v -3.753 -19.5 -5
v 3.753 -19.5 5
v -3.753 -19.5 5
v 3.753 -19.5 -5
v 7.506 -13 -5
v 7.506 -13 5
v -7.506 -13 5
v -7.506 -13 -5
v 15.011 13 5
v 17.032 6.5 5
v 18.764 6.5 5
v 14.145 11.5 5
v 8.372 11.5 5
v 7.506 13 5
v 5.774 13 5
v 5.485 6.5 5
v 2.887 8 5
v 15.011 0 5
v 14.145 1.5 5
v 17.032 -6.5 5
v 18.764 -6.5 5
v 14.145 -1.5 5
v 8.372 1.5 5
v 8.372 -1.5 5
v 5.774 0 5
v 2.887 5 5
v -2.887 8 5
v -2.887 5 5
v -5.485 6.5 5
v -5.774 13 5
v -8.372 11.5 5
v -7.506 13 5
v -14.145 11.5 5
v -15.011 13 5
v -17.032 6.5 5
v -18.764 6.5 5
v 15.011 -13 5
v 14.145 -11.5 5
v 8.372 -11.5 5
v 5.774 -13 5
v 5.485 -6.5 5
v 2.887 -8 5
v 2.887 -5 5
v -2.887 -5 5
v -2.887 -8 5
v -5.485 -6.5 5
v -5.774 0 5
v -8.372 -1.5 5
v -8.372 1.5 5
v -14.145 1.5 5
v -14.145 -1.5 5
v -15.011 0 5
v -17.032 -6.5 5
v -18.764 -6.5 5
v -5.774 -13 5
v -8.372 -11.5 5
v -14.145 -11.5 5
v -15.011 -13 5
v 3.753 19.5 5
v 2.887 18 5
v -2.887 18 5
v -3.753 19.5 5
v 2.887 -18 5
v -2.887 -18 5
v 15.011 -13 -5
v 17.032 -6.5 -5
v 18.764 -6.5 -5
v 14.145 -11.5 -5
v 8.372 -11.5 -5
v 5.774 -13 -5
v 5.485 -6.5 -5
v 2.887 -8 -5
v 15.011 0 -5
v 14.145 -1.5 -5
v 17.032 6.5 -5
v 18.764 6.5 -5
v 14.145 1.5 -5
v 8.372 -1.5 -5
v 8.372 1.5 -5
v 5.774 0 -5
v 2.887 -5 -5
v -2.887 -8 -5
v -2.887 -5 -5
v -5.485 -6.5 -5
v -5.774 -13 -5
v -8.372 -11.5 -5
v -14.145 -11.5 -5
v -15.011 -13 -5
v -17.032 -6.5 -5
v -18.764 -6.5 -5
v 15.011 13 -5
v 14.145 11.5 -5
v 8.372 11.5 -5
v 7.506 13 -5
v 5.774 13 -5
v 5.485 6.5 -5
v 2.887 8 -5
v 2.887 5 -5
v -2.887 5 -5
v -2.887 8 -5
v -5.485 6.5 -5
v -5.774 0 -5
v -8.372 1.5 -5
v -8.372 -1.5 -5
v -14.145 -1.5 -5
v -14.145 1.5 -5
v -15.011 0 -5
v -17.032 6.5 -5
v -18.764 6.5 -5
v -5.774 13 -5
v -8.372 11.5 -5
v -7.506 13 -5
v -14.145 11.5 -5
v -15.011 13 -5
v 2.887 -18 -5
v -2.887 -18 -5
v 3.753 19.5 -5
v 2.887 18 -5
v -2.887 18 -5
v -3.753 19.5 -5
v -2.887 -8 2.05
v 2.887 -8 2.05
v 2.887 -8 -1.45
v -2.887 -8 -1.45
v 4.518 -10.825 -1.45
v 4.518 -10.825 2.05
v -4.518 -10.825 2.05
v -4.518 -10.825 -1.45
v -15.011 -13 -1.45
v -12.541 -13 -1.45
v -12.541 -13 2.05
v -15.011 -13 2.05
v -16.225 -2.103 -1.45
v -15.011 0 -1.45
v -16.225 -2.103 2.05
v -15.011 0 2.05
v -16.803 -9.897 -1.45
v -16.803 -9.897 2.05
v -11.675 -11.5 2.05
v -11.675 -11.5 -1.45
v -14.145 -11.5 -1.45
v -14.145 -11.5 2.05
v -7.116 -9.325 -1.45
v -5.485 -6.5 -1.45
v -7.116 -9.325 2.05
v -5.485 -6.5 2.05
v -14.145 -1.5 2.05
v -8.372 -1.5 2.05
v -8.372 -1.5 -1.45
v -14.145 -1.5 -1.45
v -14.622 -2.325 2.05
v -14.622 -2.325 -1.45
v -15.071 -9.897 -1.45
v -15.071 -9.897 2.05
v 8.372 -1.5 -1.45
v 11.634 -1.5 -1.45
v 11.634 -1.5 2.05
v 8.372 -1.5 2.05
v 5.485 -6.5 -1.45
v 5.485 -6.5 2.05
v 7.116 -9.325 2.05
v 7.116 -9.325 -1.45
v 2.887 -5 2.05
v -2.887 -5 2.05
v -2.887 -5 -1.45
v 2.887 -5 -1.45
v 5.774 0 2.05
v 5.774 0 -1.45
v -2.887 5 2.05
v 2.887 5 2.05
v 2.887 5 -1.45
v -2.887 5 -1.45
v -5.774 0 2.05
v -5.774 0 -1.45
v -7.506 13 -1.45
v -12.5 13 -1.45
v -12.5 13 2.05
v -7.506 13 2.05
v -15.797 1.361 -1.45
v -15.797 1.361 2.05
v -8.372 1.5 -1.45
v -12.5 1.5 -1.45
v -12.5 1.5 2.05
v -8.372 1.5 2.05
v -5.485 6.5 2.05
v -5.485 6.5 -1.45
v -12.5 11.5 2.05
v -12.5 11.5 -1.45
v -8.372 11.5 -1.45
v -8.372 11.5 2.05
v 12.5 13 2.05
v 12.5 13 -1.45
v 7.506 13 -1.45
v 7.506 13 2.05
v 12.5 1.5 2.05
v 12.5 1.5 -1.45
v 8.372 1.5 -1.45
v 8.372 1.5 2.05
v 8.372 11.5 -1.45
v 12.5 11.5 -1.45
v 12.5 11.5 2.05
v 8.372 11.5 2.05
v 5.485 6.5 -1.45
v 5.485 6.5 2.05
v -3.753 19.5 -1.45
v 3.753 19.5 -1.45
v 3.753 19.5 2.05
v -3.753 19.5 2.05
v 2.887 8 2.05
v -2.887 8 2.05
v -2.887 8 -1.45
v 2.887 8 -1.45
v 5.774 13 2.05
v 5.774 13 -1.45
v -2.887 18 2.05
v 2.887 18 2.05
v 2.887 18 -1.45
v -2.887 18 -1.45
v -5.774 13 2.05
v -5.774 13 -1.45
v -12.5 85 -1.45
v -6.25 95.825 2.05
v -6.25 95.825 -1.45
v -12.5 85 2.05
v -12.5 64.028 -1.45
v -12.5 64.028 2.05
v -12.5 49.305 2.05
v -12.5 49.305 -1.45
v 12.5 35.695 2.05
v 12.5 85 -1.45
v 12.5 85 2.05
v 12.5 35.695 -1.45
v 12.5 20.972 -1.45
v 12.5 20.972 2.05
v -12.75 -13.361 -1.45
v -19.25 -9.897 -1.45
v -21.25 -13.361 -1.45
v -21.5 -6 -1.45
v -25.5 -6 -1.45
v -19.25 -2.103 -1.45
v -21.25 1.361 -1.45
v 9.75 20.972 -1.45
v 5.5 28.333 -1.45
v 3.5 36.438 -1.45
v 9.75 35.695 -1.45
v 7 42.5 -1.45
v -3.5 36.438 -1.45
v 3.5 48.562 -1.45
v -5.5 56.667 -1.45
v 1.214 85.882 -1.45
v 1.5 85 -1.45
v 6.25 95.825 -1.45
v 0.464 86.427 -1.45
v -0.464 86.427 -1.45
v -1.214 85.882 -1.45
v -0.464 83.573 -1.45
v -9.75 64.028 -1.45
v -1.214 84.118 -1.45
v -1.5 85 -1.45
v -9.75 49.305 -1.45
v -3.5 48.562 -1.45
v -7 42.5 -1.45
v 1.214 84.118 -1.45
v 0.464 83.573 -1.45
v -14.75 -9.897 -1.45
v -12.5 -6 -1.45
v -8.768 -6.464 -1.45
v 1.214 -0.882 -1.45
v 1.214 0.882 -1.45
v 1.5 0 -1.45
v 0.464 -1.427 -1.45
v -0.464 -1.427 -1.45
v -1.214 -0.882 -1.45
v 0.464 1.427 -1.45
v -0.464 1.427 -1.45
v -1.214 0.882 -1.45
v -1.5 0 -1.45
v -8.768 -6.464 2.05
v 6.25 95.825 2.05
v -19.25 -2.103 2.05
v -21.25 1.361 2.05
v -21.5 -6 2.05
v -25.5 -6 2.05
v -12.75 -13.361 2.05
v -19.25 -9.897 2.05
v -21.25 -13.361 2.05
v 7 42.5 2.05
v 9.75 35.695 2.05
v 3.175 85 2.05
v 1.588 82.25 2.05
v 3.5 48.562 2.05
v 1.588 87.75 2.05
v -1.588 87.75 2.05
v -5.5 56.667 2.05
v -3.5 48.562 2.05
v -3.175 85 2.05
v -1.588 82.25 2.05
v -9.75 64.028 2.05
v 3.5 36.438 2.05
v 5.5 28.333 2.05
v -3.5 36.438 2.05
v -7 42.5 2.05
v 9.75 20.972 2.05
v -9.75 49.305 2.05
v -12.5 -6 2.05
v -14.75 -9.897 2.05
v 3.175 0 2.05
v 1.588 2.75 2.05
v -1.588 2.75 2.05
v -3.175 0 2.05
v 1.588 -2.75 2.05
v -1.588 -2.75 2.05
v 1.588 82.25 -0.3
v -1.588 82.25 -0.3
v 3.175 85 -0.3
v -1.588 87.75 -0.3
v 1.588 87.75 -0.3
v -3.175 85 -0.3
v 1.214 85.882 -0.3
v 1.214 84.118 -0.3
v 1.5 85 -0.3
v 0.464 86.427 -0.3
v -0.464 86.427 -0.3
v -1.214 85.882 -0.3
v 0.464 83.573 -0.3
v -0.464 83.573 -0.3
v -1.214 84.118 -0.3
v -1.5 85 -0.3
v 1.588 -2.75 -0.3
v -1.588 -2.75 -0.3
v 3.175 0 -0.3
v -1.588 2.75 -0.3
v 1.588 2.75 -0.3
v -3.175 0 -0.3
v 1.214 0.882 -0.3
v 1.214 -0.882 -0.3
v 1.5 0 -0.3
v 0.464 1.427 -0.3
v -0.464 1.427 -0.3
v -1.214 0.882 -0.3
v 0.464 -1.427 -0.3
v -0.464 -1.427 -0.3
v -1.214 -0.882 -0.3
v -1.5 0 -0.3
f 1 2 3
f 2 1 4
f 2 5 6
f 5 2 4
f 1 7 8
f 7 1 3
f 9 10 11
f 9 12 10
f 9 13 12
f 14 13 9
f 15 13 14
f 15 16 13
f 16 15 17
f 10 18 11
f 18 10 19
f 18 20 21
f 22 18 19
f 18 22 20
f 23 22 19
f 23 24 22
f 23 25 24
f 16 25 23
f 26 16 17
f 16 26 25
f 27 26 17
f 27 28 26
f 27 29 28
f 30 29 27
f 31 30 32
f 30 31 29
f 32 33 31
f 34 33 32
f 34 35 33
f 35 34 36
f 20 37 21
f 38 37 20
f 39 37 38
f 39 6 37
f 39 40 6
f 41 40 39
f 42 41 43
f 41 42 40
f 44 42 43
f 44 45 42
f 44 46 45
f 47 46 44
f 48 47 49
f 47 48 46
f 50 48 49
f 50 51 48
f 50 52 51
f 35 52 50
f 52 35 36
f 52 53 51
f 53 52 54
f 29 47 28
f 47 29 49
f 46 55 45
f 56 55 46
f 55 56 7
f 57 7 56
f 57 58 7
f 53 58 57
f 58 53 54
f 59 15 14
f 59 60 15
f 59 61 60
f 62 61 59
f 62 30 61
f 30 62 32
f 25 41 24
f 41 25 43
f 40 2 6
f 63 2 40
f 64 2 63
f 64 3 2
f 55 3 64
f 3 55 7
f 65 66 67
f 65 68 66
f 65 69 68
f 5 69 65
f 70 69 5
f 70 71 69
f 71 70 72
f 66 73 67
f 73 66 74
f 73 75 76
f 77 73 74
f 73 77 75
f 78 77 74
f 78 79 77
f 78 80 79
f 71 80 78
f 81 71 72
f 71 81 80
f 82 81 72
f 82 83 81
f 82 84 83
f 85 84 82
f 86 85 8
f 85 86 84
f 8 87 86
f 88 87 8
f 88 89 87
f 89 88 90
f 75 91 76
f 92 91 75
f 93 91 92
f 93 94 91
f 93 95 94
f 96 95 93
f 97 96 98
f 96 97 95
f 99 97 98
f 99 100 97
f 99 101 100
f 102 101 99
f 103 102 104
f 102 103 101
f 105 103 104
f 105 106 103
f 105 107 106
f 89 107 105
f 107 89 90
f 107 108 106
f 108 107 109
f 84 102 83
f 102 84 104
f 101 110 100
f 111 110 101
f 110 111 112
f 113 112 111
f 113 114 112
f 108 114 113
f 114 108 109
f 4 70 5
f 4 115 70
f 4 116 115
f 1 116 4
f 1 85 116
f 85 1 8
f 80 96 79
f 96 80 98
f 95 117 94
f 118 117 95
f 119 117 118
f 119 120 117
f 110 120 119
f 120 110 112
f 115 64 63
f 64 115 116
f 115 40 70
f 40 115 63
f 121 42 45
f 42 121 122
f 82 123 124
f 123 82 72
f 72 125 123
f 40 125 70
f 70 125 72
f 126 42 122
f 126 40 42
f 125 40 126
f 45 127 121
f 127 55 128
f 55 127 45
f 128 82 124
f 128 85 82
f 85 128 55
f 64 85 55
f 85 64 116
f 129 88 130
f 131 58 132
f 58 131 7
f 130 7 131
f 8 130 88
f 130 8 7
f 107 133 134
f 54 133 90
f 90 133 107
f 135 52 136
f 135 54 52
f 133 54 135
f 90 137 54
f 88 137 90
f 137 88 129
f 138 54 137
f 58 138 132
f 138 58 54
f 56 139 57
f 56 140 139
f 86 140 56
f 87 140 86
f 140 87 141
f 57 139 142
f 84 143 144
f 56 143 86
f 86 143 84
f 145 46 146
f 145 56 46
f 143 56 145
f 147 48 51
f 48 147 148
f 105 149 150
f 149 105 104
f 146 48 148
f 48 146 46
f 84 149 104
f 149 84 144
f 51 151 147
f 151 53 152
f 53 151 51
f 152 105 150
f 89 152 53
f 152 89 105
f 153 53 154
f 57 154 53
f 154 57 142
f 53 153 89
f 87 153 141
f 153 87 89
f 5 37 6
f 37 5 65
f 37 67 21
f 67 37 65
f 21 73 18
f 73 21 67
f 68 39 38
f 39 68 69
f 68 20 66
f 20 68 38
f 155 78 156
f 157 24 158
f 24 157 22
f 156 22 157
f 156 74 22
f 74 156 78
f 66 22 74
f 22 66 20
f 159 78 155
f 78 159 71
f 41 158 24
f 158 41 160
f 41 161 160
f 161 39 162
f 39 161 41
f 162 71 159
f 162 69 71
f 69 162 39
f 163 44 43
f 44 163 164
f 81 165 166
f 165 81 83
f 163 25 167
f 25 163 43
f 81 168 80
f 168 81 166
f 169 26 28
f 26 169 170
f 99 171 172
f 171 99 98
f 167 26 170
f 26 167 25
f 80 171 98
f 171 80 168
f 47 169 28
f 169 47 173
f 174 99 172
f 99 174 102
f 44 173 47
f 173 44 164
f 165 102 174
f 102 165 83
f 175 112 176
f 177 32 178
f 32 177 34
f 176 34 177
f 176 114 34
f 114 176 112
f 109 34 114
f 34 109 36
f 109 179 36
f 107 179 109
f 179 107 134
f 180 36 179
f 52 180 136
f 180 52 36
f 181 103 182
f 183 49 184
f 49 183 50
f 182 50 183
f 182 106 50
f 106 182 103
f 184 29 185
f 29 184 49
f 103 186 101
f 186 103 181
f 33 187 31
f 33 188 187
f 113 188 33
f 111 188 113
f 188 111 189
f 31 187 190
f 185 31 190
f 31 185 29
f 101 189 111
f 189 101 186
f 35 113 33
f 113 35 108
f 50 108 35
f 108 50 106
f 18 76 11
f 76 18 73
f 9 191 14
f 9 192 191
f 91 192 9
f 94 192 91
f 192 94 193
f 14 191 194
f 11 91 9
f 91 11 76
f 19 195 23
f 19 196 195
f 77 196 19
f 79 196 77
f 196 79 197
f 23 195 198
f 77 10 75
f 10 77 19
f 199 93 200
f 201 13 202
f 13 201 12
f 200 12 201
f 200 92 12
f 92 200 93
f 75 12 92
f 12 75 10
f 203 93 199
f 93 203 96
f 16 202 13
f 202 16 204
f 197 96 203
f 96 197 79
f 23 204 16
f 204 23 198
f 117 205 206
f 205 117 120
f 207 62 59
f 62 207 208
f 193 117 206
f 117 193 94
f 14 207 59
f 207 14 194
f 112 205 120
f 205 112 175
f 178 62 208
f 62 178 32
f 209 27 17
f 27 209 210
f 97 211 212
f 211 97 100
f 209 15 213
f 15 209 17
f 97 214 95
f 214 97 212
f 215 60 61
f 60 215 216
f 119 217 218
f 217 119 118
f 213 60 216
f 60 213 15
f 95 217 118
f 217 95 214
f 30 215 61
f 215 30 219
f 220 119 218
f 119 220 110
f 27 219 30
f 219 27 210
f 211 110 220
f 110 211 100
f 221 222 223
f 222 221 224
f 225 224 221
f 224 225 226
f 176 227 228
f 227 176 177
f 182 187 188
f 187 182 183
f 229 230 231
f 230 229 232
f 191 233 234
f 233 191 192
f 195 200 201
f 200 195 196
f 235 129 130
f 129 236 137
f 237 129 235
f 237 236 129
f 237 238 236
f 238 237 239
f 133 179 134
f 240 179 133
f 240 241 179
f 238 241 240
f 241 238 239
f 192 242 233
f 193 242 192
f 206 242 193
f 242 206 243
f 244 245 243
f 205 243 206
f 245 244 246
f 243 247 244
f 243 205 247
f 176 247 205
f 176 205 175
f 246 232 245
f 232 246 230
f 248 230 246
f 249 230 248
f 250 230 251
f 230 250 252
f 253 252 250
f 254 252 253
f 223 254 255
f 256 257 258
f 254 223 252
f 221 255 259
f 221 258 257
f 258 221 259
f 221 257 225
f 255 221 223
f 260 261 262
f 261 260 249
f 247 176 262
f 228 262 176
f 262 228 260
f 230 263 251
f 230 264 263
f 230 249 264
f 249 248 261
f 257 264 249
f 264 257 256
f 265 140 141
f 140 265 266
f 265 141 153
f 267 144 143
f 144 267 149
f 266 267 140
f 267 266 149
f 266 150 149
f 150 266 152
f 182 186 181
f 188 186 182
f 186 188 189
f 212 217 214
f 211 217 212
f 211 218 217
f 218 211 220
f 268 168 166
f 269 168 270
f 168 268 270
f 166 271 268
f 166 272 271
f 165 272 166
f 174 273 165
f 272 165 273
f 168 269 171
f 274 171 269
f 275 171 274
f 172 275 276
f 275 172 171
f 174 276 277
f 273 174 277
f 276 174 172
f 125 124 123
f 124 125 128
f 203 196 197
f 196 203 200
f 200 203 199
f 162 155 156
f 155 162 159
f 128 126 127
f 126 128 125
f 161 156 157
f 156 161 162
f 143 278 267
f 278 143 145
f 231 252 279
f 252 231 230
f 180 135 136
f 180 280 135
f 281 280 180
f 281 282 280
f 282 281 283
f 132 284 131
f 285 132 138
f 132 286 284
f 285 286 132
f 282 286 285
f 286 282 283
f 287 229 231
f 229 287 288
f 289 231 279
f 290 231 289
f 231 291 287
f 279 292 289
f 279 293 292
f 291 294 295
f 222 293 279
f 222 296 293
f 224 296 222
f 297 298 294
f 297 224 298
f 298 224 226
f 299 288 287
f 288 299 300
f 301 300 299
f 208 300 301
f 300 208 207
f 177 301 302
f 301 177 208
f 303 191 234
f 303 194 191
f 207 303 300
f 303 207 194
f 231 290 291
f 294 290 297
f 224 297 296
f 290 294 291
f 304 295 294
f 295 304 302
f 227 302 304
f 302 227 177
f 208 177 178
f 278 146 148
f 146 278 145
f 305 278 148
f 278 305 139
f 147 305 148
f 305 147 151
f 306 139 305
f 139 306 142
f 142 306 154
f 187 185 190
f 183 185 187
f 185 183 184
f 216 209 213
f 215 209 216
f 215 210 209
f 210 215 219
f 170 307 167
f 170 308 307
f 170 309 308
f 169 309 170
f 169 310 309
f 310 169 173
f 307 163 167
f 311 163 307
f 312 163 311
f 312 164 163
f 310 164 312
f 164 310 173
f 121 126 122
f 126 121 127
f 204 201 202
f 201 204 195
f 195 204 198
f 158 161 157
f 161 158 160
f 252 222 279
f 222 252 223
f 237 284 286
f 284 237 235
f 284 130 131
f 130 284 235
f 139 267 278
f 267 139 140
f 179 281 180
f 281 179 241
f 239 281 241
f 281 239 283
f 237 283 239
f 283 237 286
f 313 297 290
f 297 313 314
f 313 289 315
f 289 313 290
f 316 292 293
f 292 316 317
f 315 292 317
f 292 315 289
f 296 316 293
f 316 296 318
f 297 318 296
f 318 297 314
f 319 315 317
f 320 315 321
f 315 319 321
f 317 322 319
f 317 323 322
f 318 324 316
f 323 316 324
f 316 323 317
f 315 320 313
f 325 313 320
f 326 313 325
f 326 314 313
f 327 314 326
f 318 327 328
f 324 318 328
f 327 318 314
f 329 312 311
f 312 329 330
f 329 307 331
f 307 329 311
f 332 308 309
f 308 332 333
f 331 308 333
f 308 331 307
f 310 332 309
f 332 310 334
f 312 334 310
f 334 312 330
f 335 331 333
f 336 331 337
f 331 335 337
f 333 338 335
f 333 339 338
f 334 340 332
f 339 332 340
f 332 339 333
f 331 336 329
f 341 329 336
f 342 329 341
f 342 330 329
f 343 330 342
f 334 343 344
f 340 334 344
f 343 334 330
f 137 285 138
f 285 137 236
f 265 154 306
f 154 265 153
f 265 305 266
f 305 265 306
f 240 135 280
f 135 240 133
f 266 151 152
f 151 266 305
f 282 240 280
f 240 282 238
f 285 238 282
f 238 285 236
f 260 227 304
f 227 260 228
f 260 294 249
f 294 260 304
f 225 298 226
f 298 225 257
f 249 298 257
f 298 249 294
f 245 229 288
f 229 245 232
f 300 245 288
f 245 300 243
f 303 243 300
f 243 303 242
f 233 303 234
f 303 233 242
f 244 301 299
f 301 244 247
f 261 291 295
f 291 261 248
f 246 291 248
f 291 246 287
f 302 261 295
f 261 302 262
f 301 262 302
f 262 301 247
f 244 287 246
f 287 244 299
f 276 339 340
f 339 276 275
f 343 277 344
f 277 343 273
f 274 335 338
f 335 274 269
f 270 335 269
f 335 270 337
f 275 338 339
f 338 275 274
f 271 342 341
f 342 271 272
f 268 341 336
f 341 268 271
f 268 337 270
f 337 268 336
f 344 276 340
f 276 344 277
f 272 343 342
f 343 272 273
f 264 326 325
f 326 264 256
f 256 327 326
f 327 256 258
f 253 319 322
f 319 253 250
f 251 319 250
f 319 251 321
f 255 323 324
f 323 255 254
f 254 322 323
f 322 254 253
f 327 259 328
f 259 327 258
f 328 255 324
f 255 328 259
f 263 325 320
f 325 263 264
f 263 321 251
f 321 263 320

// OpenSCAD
// file: nutsnbolts/data-access.scad
// Norm Nuts and Bolts - a OpenSCAD library
// Copyright (C) 2012  Johannes Kneer

// This program is free software: you can redistribute it and/or modify
// it under the terms of the GNU General Public License as published by
// the Free Software Foundation, either version 3 of the License, or
// (at your option) any later version.

// This program is distributed in the hope that it will be useful,
// but WITHOUT ANY WARRANTY; without even the implied warranty of
// MERCHANTABILITY or FITNESS FOR A PARTICULAR PURPOSE.  See the
// GNU General Public License for more details.

// You should have received a copy of the GNU General Public License
// along with this program.  If not, see <http://www.gnu.org/licenses/>.


// DATABASE ACCESS FUNCTIONS AND CONSTANTS



// == CONSTANTS ==

// screw table access keys
_NB_S_DESC            = 0;
_NB_S_FAMKEY			    = 1;
_NB_S_LENGTH          = 2;
_NB_S_NOTHREAD_LENGTH = 3;

_NB_F_DESC			      = 0;
_NB_F_OUTER_DIA       = 1;
_NB_F_INNER_DIA       = 2;
_NB_F_LEAD            = 3;
_NB_F_KEY             = 4;
_NB_F_KEY_DEPTH       = 5;
_NB_F_HEAD_HEIGHT     = 6;
_NB_F_HEAD_DIA        = 7;
_NB_F_NUT_KEY         = 8;
_NB_F_NUT_HEIGHT      = 9;
_NB_F_PITCH_FINE      = 10;
_NB_F_PITCH_MEDIUM    = 11;
_NB_F_PITCH_COARSE    = 12;


// == FUNCTIONS ==

// _get_screw("descriptor")   with descriptor = M8x25
//   find the line for a general object in the data matrix

function _get_screw(n) = data_screw[search([n], data_screw)[0]];
function _get_screw_fam(n) = data_screw_fam[search([_get_screw(n)[_NB_S_FAMKEY]], data_screw_fam)[0]];

function _get_fam(n) = data_screw_fam[search([n], data_screw_fam)[0]];


// _get_XXXXX("descriptor") functions
// find a single property in the database

function _get_desc(n)        = _get_screw(n)[_NB_S_DESC];
function _get_famkey(n)         = _get_screw(n)[_NB_S_FAMKEY];
function _get_length(n)      = _get_screw(n)[_NB_S_LENGTH];
function _get_nt_length(n)   = _get_screw(n)[_NB_S_NOTHREAD_LENGTH];

function _get_outer_dia(n)   = _get_screw_fam(n)[_NB_F_OUTER_DIA];
function _get_inner_dia(n)   = _get_screw_fam(n)[_NB_F_INNER_DIA];
function _get_lead(n)        = _get_screw_fam(n)[_NB_F_LEAD];
function _get_head_height(n) = _get_screw_fam(n)[_NB_F_HEAD_HEIGHT];
function _get_head_dia(n)    = _get_screw_fam(n)[_NB_F_HEAD_DIA];
function _get_nut_key(n)     = _get_screw_fam(n)[_NB_F_NUT_KEY];
function _get_nut_height(n)  = _get_screw_fam(n)[_NB_F_NUT_HEIGHT];
function _get_fine_pitch(n)  = _get_screw_fam(n)[_NB_F_PITCH_FINE];
function _get_medium_pitch(n)  = _get_screw_fam(n)[_NB_F_PITCH_MEDIUM];
function _get_coarse_pitch(n)  = _get_screw_fam(n)[_NB_F_PITCH_COARSE];
// file: honeycomb.scad
//Tesselated Hexagons


//number of "stacked" cells along a line of symetry
number = 3; //[1, 3, 5, 7, 9, 13]
//distance across flat sides (inradius) 
flats = 10;
//wall thickness - set to 0 and invert to true to make touching tiles
walls = 3; 
//height of comb
height = 10; //[1:10]
//invert = false (honeycomb); invert = true (tiles)
invert = false; //[true, false]



hexTessalation(number = number, h = height, flat = flats, wall = walls, invert = invert);

function flatToRadius(flats) = flats/2/sin(60);


/*
  number = number of hexagons (integer)
  r1 = radius for spacing of hexagonal grid 
  r2 = radius for cutout of honeycomb
  h = height of tiles
  invert = false/true (boolean) 
    - false produces a honeycomb with radius r1 or tiles with no gaps
    - true produces tiles with radius r2 spaced on a gird equal to r1
*/

module hexRow(number = 2, r1 = 10, r2 = 0, h = 2, invert = false) {
  // range to be used in the for loop below
  range = number < 1 ? 0 : number/2-0.5;

  // curve refinement
  $fn = 6;
  for (i = [-range:range]) {
    difference() {
      //invert = true produces honeycomb, invert = true produces hexagons
      if (invert == false) {
        translate([r1*3*i, 0, 0])
          cylinder(r = r1, h = h, center = true);
      }
      if (r2 > 0) {
        //if inverting, make the cutter larger to avoid z fightingv
        cut = invert==false ? 0.01 : 0;       
        translate([r1*3*i, 0, 0])
          cylinder(r = r2, h = h+cut, center = true);
      }
    }
  }

}

/*
  draw a tessalated grid of hexagons
  n = number of hexagons across line of symetry (integer)
  flat = distance across flats for honeycomb cells
  wall = thickness of walls between each cell
  h = height 
*/

/*

  N = number of cells through the vertical line of semmetry (stacked cells)
  total rows along x axis: N * 2 - 1
  turning term: point at which number of rows stops increasing and begins alternating
  even/odd turning term: if the turning term index value is even or odd

  N = 1: [1]
  N = 3: 1, 2, [1], 2, 1
    total: 5
    turning term: 3 [1]

  N = 5: 1, 2, 3, [2, 3, 2], 3, 2, 1
    total: 9
    turning term: 4 [2] (even)

  N = 7: 1, 2, 3, 4, [3, 4, 3, 4, 3], 4, 3, 2, 1
    total: 13
    turning term: 5 [3] (odd)

  N = 9: 1, 2, 3, 4, 5, [4, 5, 4, 5, 4, 5, 4], 5, 4, 3, 2, 1 
    total: 17
    turning term: 6 [4] (even)


*/


module hexTessalation(number = 3, flat = 5, wall = 0, h = 2, invert = false) {
  r1 = flatToRadius(flat+wall); // outside hexagon
  r2 = wall <= 0 ? 0 : flatToRadius(flat); //inside hexagon
  ySpacing = flat+wall;
  yTranslate = ySpacing/2;
  total = number*2-1; // total number of rows in X dimension
  colors = ["red", "yellow", "blue"]; //array of colors to choose from 
  add=[-1, 0]; // array of values to be added depending on odd or even status of i
  
  // N mod 4 identifies odd/even turning terms
  // number%4 = 1: subtract one from even terms, add 0 to odd
  // number%4 = 3: subtract one from odd terms, add 0 to even
  add = [ ["null"], [-1, 0], ["null"], [0, -1] ];

  echo(str("total terms: ", total));
  echo(str("turning term: ", ceil(number/2)+1));

  union(){

  translate([0, -number/2*ySpacing+ySpacing/2, 0])
  for ( i = [1:total]) {
    //bottom 1/3
    if ( i <=ceil(number/2) ) {
      translate([0, yTranslate*i-ySpacing/2, 0])
        //choose color depending on row index
        color(colors[i%3])
        hexRow(number = i, r1 = r1, r2 = r2, h = h, invert = invert);
    }


    //middle 1/3
    if ( ceil(number/2)+1 <= i && i <=ceil(number/2)+1+number-3) {
      translate([0, yTranslate*i-ySpacing/2, 0])
        color(colors[i%3])
          //add 0 or subtract 1 
          hexRow(number = ceil(number/2)+add[number%4][i%2], 
          r1 = r1, r2 = r2, h = h, invert = invert);

    }

    if ( ceil(number/2)+1 +number-3 < i ) {
      translate([0, yTranslate*i-ySpacing/2, 0])
        color(colors[i%3])
        hexRow(number = total+1-i, 
          r1 = r1, r2 = r2, h = h, invert = invert);
//      echo("3/3", i, total+1-i);
    }
  }
  }
}

//hexTessalation(number = 5, flat = 10, wall = 5, invert = false);
//hexTessalation(number = 5, flat = 10, wall = 5, invert = false);

//hexRow(3, r1 = 10, r2 = 9.9, invert = false);
// main file
$fn = 10;
include<honeycomb.scad>
include<nutsnbolts/cyl_head_bolt.scad>

part = "upper";
keyring = true;
length = 85;        //space between the screws
honeycomb_pattern_offset = 8;
hex_segments = 6;
hex_pattern_thickness = 1;
hex_pattern_width = 18.9;
your_text = "free as in freedom (CC-BY-SA)";

module EmptyFlashDriveDrawer() {
    difference()
    {
        hull(){
            hexagon(25,6.6);
        }
        translate([0,0,-7])cylinder(20,d=4);
        translate([-5.5,0,-2.3])cube([11.9,20,4.6])
        translate([-7.3,11.5,-2]) rotate([90,0,-120]) linear_extrude(height = .5)text("USB",4);
        translate([12.9,2,-2]) rotate([90,0,120]) linear_extrude(height = .5)text("USB",4);
    }
}

if(part == "upper" || part == "lower")
{
  difference() {
      union()
      {
        hull()
        {
          translate([0,0,-1.45])cylinder(3.5, d=25, $fn=6);
          translate([0,length,-1.45])cylinder(3.5, d=25, $fn=6);
        }
        if(part == "upper" && keyring==true) translate([-17,-6,-1.45])cylinder(3.5, d=17, $fn=6);
      }
      translate([0,0,-5])cylinder(8, d=3);
      translate([0,length,-5])cylinder(8, d=3);
      
      

      if(part == "upper")
      {
        translate([0,length,2.1])nut("M3");
        translate([0,0,2.1])nut("M3");
        translate([-17,-6,-1.46])cylinder(5, d=9, $fn=6);
        translate([-14,length*(2/3),-1.46])cylinder(5, d=17, $fn=6);
        translate([14,length*(1/3),-1.46])cylinder(5, d=17, $fn=6);
        translate([0,length/2,-1.46])cylinder(5, d=14, $fn=6);
      }

      if(part == "lower")
      {
        hex_element_size =(length-2*honeycomb_pattern_offset-(hex_segments+1)*hex_pattern_thickness)/hex_segments;
        translate([-hex_pattern_width/2,honeycomb_pattern_offset,0]) 
          antiHoneycomb(hex_pattern_width, length-2*honeycomb_pattern_offset, 10, hex_element_size
          , hex_pattern_thickness);
        translate([-10.5,length/2,-2.8])rotate([0,180,90])linear_extrude(height = .5) text("Designed by Mattis Männel",4,"Ubuntu",halign="center");

        translate([9.8,length/2,-2.8])rotate([0,180,90])linear_extrude(height = .5) text(your_text,3.8,"Ubuntu Mono",halign="center", valign="top");
        //screw head spaces
        translate([0,0,-3.3])cylinder(2, d2=3, d1=6);
        translate([0,length,-3.3])cylinder(2, d2=3, d1=6);
      }
  }
}

if(part == "usb-drawer" || part == "usb_drawer")
{
  EmptyFlashDriveDrawer();
}
